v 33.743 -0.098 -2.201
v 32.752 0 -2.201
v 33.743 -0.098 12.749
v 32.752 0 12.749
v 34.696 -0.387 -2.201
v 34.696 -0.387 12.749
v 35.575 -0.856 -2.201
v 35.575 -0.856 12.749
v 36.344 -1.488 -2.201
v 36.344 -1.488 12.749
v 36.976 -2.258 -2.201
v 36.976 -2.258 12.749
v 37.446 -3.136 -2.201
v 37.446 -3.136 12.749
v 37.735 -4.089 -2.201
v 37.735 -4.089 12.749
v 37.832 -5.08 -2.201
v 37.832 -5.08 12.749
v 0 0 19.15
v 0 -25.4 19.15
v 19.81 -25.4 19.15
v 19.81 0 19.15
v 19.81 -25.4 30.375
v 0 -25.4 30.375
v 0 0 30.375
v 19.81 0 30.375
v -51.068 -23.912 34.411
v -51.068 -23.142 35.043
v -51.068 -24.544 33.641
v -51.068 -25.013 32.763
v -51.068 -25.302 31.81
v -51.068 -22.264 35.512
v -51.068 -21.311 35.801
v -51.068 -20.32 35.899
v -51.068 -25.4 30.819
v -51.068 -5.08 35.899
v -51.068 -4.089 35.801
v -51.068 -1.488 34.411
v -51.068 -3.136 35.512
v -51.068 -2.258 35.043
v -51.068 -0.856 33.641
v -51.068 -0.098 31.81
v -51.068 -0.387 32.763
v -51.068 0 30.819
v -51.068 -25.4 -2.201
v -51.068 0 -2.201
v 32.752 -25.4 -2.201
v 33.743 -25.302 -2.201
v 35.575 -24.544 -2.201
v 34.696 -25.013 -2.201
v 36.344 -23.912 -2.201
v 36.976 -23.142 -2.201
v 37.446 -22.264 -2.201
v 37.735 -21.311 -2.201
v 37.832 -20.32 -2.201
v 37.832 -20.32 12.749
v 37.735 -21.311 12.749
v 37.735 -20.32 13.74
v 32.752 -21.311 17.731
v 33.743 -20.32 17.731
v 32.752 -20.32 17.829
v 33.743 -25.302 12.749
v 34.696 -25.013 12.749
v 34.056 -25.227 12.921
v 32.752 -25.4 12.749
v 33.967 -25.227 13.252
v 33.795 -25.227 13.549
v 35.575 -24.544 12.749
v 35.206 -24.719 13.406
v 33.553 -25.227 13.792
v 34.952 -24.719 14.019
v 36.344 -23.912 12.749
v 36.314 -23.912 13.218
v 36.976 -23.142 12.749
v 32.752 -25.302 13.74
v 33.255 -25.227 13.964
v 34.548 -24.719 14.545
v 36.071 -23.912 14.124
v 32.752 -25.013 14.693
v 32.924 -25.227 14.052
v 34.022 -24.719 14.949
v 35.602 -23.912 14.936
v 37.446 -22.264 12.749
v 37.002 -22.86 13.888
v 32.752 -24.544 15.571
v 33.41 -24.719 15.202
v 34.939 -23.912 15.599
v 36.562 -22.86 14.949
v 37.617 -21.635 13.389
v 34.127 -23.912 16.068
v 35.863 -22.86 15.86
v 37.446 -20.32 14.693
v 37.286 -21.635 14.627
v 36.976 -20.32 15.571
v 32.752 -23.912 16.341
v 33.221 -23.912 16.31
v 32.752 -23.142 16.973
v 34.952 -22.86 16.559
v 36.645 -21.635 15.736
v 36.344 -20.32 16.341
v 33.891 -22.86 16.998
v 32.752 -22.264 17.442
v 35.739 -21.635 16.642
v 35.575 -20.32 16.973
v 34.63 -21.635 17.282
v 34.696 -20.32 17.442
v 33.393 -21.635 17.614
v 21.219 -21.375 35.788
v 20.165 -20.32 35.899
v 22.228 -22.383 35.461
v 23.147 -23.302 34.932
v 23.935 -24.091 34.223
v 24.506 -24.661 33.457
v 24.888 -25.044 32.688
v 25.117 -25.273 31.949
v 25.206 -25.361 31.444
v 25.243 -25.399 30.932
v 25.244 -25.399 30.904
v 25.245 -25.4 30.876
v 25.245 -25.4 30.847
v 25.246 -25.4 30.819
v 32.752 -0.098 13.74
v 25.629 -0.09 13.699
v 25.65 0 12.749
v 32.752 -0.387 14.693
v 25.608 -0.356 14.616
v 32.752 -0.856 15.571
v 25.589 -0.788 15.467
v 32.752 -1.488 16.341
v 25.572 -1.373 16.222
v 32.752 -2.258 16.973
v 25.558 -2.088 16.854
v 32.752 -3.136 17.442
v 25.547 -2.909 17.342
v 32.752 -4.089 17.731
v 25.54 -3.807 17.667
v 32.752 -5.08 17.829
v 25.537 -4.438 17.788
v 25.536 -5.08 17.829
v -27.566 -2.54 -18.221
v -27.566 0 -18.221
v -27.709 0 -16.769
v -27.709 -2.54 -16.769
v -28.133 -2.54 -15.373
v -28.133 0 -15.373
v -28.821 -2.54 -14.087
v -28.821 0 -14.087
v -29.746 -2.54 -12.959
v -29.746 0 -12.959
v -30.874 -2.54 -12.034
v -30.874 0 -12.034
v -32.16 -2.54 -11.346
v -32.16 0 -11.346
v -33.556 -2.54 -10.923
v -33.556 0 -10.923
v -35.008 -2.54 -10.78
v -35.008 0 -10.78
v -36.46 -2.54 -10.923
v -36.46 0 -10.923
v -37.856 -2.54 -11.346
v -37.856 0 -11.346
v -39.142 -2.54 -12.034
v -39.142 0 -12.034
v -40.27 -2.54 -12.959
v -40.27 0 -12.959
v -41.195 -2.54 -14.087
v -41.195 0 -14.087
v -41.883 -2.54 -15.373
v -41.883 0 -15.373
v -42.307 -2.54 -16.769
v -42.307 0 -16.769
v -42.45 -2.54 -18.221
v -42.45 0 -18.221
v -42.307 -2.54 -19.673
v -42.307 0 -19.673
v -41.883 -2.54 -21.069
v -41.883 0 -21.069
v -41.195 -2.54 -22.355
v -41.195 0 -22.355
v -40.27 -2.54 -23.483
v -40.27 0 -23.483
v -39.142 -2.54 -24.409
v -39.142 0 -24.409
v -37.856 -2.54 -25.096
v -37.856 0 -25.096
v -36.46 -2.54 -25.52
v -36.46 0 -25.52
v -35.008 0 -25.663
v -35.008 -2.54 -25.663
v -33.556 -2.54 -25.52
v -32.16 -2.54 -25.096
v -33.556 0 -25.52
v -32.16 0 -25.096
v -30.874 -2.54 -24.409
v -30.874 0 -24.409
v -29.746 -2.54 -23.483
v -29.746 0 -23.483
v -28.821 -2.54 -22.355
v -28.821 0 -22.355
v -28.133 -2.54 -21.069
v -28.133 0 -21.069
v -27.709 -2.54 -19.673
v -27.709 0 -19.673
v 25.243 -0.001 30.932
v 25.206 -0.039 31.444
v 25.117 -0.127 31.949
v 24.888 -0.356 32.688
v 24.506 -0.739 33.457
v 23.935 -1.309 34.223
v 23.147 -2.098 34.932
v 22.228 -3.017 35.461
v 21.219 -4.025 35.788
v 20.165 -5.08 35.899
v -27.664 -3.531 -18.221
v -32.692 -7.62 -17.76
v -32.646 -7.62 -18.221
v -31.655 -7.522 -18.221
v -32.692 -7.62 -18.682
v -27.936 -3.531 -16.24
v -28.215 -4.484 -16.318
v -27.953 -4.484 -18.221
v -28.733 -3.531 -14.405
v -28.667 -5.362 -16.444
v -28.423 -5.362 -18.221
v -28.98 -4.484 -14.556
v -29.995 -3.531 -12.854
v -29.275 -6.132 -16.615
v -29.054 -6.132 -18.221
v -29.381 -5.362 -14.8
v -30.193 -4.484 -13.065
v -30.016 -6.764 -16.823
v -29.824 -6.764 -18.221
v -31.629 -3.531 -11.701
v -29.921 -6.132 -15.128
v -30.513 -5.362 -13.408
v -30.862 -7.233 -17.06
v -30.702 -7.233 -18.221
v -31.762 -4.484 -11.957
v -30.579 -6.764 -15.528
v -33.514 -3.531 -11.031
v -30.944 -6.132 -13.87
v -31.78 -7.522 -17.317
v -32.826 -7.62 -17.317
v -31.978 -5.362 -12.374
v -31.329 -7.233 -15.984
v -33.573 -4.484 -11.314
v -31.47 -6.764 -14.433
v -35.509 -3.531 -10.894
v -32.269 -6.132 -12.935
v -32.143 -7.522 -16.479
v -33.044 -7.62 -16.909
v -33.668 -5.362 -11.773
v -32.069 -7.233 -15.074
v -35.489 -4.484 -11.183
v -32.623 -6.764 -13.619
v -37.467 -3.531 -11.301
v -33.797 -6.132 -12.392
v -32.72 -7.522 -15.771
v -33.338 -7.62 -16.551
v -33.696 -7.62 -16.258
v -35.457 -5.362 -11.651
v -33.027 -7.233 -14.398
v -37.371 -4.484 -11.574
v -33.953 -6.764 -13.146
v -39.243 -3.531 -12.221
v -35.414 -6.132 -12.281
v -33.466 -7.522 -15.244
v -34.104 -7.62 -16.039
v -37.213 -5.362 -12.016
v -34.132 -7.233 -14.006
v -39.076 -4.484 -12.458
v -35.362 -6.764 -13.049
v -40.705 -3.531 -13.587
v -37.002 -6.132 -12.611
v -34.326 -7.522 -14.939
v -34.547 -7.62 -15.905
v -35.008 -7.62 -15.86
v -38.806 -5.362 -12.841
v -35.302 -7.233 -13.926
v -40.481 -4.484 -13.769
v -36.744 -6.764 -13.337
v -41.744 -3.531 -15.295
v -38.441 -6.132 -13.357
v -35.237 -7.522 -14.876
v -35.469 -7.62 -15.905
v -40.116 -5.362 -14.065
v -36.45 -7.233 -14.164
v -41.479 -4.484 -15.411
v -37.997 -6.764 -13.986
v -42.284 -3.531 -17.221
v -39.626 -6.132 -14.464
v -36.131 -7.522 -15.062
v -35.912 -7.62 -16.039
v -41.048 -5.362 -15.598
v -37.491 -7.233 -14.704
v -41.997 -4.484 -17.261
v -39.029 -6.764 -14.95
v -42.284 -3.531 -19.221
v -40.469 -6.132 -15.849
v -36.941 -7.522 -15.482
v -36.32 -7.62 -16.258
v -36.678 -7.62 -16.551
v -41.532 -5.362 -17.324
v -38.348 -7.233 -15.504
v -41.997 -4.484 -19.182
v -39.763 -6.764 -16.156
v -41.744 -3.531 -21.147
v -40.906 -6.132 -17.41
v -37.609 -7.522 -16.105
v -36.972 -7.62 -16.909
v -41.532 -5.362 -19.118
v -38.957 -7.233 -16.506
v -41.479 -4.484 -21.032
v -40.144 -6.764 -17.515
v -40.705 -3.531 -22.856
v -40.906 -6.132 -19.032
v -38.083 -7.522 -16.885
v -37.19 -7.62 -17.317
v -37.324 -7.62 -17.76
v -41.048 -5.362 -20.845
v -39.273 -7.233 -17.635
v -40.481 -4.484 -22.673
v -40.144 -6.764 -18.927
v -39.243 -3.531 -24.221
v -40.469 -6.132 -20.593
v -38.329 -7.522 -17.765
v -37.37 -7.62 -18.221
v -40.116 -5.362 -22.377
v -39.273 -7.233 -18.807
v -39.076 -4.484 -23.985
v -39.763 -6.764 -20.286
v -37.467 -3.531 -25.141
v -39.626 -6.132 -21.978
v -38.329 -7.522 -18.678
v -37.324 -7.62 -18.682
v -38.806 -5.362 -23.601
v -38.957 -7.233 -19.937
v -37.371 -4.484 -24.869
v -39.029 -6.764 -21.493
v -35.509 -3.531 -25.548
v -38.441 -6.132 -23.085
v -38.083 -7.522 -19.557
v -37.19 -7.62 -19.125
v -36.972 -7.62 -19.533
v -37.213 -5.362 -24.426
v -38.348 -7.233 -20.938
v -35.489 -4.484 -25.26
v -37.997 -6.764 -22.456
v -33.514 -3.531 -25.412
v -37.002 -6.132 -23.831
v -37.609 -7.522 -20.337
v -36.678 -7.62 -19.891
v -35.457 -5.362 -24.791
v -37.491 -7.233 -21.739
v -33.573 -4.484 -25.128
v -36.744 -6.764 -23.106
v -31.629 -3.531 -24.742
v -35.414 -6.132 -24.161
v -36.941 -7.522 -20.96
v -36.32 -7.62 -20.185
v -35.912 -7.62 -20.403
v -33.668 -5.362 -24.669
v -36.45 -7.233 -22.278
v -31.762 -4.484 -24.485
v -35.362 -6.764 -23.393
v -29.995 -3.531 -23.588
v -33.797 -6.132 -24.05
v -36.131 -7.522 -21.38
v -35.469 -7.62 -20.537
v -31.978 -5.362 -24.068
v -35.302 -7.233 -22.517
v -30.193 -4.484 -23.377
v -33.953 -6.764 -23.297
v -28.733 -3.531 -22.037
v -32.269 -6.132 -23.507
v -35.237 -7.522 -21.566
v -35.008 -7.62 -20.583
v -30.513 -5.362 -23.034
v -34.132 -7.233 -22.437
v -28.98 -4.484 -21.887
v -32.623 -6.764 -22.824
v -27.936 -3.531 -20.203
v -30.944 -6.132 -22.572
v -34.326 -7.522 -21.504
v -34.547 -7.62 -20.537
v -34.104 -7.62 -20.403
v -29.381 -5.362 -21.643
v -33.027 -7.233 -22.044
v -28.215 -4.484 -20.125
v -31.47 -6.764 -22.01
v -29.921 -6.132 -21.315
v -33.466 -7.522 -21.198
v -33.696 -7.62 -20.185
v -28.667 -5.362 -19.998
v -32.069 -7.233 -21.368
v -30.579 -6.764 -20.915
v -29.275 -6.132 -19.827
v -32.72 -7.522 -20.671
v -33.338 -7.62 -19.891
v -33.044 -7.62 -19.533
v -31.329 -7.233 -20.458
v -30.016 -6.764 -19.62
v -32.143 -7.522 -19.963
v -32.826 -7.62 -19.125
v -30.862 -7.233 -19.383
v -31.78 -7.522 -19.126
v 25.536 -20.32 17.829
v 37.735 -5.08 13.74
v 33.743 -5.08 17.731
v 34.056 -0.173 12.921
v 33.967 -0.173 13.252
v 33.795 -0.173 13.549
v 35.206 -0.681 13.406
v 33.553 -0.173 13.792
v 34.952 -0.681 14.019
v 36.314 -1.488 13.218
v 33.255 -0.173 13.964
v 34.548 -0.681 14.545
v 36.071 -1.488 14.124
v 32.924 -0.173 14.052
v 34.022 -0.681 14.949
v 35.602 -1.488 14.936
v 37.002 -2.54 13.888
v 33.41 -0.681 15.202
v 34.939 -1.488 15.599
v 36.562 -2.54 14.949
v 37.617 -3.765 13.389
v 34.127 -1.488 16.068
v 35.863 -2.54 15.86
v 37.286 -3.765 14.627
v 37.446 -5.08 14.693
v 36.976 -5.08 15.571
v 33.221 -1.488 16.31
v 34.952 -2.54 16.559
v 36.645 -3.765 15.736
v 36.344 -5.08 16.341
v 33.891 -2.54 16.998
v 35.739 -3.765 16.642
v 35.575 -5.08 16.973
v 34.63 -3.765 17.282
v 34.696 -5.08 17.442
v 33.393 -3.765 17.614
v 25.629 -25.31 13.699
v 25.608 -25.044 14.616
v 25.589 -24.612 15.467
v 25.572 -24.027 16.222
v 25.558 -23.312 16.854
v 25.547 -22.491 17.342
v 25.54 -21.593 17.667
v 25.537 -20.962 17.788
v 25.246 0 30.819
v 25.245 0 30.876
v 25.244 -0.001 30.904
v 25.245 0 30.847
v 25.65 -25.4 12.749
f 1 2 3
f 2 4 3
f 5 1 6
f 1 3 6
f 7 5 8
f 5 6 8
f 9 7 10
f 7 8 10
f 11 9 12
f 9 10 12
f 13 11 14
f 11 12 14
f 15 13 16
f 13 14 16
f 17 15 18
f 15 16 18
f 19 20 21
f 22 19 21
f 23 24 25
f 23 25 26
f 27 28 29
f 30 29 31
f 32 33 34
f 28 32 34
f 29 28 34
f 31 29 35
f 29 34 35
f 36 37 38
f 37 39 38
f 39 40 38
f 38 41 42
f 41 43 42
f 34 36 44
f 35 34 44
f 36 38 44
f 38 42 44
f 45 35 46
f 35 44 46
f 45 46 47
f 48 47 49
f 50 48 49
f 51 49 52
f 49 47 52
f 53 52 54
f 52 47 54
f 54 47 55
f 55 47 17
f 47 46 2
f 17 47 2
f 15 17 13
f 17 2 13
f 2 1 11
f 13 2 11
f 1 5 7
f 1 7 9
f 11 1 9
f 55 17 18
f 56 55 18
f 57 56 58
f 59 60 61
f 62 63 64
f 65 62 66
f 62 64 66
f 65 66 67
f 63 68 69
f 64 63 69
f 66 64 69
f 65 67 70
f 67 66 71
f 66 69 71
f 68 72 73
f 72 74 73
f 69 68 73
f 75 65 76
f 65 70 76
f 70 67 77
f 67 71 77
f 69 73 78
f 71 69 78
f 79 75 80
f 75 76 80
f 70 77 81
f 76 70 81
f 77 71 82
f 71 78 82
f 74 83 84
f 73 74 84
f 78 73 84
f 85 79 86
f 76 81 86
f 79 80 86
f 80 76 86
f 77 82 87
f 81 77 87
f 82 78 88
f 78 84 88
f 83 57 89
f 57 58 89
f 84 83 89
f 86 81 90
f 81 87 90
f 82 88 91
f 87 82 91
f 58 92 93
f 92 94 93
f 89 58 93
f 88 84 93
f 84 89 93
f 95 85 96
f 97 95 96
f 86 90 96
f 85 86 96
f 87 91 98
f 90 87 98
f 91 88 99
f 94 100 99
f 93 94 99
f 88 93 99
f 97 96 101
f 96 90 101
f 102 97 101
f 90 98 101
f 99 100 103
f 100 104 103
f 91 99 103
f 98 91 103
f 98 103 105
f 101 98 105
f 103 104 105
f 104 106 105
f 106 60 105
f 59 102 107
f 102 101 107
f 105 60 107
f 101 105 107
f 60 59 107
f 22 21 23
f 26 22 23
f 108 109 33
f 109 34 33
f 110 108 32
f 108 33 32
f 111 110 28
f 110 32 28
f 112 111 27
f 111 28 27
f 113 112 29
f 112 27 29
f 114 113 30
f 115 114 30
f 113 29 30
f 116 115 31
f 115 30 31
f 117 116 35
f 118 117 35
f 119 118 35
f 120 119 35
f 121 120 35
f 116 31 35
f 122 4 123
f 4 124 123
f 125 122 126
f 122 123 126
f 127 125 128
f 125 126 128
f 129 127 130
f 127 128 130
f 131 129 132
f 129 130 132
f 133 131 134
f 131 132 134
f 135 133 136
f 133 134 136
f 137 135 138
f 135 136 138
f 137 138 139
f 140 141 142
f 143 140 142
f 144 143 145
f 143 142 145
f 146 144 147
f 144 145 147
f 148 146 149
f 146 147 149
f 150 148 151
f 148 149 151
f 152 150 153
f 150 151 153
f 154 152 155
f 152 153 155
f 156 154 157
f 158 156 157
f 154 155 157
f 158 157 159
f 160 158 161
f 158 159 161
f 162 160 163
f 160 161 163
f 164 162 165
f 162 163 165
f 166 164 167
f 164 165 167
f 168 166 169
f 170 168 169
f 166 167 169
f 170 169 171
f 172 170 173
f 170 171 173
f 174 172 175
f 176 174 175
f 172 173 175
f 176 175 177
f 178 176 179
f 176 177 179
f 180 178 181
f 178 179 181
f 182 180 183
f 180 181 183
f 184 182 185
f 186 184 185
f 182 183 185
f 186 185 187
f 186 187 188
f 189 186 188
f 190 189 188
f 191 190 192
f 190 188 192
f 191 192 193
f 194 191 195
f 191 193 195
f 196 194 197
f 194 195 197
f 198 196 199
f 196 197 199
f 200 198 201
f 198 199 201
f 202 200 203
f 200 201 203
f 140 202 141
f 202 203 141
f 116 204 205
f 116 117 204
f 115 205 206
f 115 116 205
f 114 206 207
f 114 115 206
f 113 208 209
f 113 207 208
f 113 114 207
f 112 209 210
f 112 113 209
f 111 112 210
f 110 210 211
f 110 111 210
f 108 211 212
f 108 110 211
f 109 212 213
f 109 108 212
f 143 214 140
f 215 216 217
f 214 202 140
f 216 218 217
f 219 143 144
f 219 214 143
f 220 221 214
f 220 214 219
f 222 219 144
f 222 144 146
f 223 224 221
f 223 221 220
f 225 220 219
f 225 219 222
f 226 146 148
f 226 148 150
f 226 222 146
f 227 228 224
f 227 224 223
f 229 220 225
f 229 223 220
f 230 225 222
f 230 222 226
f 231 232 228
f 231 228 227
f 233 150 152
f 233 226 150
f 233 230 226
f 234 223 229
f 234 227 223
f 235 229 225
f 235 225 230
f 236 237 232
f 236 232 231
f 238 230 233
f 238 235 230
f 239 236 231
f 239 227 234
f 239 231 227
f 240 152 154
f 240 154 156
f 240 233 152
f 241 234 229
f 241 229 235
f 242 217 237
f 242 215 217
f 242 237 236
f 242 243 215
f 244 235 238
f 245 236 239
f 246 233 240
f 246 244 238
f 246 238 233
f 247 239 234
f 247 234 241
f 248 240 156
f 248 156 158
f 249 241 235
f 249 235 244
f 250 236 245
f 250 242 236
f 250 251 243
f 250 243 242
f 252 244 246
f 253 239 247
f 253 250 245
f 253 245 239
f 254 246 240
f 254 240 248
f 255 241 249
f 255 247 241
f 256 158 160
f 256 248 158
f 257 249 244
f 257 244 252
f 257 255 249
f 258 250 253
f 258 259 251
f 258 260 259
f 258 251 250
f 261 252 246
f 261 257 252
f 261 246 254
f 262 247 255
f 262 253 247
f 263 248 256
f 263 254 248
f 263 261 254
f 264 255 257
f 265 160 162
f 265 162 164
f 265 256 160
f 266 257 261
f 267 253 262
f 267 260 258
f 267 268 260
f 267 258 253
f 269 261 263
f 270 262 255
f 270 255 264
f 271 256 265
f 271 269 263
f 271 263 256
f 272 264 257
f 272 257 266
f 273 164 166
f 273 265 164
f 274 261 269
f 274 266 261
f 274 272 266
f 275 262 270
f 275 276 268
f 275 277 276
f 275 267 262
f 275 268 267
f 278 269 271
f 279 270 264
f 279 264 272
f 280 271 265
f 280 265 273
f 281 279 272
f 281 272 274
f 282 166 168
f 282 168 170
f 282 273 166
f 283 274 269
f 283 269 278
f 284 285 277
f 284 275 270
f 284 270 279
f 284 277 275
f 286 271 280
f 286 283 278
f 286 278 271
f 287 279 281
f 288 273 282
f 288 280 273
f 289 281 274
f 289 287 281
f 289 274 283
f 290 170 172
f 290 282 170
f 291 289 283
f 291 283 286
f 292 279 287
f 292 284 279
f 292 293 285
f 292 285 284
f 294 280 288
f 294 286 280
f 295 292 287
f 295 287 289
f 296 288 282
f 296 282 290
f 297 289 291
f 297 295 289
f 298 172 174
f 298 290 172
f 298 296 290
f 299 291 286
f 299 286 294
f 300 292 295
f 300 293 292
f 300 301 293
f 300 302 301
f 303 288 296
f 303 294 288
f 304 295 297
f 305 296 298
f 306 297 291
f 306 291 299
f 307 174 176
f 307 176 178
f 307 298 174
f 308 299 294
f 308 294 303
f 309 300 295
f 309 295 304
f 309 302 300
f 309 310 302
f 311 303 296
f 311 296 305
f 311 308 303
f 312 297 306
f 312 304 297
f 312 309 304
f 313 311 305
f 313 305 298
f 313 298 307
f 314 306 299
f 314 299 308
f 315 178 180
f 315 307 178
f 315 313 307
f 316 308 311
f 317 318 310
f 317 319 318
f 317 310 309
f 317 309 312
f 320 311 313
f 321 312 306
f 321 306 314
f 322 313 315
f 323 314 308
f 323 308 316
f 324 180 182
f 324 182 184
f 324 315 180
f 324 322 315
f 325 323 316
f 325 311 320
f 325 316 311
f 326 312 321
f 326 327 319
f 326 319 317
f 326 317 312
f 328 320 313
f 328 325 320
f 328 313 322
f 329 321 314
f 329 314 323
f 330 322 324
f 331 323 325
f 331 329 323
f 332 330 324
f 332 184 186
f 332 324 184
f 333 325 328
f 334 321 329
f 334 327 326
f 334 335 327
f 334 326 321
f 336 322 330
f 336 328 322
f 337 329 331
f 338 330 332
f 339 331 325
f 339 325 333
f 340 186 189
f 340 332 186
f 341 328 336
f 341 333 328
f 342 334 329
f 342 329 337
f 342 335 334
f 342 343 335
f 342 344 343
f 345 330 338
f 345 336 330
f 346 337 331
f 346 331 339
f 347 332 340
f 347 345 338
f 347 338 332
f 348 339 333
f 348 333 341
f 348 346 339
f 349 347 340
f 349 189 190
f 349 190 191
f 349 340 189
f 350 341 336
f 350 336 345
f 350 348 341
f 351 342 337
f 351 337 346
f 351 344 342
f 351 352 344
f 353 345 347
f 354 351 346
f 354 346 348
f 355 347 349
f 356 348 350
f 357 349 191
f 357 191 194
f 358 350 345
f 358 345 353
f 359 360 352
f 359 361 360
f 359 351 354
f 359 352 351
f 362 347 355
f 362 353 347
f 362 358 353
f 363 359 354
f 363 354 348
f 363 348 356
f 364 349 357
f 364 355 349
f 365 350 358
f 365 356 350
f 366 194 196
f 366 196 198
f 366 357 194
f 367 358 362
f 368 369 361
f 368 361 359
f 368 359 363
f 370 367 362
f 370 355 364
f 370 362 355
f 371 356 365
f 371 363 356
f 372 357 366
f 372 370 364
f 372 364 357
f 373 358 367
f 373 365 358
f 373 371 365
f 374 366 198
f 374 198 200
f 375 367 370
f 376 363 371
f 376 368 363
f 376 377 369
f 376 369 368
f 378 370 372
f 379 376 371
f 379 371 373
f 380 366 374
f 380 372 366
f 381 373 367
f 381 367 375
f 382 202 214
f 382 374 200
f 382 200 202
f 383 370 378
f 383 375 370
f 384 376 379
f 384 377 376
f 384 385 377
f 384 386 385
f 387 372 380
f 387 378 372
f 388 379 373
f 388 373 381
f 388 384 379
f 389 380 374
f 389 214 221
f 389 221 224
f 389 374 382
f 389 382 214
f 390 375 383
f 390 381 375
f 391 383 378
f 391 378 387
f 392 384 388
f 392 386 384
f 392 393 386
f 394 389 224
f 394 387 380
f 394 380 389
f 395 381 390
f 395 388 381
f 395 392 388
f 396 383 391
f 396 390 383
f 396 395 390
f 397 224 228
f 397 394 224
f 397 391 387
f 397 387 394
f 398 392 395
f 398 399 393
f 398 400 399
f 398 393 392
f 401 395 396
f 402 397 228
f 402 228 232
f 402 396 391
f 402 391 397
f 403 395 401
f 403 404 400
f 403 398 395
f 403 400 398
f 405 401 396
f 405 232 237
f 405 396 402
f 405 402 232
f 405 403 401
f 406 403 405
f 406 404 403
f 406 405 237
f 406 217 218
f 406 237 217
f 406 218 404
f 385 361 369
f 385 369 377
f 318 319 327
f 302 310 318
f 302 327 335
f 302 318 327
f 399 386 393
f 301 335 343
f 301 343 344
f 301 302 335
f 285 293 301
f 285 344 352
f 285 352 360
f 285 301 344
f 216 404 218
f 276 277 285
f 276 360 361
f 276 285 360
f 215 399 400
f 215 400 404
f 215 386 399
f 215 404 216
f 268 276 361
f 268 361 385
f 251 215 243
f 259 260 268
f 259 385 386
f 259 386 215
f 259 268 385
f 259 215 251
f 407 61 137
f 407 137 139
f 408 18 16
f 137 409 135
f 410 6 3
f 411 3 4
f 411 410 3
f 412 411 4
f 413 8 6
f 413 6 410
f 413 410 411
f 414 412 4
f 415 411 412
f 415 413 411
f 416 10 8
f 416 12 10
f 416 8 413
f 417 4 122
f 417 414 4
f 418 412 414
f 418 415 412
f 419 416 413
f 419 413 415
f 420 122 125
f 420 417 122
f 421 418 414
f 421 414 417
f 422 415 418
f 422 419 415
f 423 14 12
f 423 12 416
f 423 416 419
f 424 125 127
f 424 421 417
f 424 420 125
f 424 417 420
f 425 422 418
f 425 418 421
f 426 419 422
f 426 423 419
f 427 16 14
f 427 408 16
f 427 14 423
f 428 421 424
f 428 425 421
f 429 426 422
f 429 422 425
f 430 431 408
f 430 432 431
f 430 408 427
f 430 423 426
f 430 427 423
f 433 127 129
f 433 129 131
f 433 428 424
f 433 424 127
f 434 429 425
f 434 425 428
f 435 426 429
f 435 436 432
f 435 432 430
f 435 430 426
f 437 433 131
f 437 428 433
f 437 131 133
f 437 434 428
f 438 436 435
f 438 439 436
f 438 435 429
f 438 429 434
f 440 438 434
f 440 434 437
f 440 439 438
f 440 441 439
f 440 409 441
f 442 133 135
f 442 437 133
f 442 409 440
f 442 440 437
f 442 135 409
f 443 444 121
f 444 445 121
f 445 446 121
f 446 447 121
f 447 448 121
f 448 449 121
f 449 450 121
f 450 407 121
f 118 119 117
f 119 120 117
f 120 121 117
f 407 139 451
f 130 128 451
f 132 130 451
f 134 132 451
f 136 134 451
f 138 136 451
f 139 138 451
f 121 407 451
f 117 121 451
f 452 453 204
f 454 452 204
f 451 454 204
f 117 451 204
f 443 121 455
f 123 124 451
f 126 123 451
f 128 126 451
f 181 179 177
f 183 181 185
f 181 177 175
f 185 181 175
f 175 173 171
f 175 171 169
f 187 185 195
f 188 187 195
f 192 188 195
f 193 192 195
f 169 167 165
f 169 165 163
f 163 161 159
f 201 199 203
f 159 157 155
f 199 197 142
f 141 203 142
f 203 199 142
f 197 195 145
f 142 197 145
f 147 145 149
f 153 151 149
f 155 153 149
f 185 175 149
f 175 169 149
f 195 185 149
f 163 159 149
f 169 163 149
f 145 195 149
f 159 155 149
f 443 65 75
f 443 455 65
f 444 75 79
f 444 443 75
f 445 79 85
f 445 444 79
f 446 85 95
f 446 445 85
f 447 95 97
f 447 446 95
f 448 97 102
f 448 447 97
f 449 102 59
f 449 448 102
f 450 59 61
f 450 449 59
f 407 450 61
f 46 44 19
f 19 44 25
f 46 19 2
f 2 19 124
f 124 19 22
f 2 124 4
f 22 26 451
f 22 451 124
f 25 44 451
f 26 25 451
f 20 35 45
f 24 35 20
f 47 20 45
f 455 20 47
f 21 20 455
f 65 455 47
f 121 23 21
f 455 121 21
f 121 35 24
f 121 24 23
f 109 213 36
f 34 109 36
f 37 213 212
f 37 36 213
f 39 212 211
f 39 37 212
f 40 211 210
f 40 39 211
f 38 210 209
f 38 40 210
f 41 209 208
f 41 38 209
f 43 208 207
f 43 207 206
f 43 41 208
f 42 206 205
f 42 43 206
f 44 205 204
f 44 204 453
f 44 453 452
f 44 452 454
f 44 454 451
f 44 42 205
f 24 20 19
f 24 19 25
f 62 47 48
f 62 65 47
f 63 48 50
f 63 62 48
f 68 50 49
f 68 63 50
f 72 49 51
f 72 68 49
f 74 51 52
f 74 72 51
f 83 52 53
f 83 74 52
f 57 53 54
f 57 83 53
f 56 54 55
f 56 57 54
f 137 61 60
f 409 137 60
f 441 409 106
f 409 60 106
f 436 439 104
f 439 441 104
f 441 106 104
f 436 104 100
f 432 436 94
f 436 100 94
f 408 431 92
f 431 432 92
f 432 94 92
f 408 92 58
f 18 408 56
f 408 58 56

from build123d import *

# Parameters (mm, degrees)
F1_DEPTH = 25.4
F2_W     = 19.809905
F2_H     = 11.225612
F3_DEPTH = 25.4
F4_R     = 7.441566
F5_DEPTH = 7.62
F6_R     = 5.08
F7_R     = 5.08
F8_R     = 5.08


with BuildPart() as f1:
    # F0 (on Front) → F1 (new body)
    with BuildSketch(Plane.XZ):
        Polygon((25.536364, 17.828913), (25.132249, 35.898899), (-51.067751, 35.898899), (-51.067751, -2.201101), (37.832249, -2.201101), (37.832249, 17.828913), align=None)
    extrude(amount=F1_DEPTH)

    # F2 (on face) → F3 (cut)
    with BuildSketch(Plane.XZ.offset(25.4)):
        with Locations((9.904953, 24.76238)):
            Rectangle(F2_W, F2_H)
    extrude(amount=-F3_DEPTH, mode=Mode.SUBTRACT)

    # F7
    f7_edges = [f1.edges().sort_by_distance(p)[0] for p in [
        (37.832249, -12.7, 17.828913),
        (-12.967751, 0, 35.898899),
        (25.132249, -12.7, 35.898899),
        (-12.967751, -25.4, 35.898899),
    ]]
    fillet(f7_edges, radius=F7_R)

    # F8
    f8_edges = [f1.edges().sort_by_distance(p)[0] for p in [
        (37.832249, 0, 5.273906),
        (37.832249, -25.4, 5.273906),
    ]]
    fillet(f8_edges, radius=F8_R)


with BuildPart() as f5:
    # F4 (on Front) → F5 (new body)
    with BuildSketch(Plane.XZ):
        with Locations((-35.007972, -18.221185)):
            Circle(F4_R)
    extrude(amount=F5_DEPTH)

    # F6
    f6_edges = [f5.edges().sort_by_distance(p)[0] for p in [
        (-42.449538, -7.62, -18.221185),
    ]]
    fillet(f6_edges, radius=F6_R)


solid = Compound([f1.part, f5.part])
